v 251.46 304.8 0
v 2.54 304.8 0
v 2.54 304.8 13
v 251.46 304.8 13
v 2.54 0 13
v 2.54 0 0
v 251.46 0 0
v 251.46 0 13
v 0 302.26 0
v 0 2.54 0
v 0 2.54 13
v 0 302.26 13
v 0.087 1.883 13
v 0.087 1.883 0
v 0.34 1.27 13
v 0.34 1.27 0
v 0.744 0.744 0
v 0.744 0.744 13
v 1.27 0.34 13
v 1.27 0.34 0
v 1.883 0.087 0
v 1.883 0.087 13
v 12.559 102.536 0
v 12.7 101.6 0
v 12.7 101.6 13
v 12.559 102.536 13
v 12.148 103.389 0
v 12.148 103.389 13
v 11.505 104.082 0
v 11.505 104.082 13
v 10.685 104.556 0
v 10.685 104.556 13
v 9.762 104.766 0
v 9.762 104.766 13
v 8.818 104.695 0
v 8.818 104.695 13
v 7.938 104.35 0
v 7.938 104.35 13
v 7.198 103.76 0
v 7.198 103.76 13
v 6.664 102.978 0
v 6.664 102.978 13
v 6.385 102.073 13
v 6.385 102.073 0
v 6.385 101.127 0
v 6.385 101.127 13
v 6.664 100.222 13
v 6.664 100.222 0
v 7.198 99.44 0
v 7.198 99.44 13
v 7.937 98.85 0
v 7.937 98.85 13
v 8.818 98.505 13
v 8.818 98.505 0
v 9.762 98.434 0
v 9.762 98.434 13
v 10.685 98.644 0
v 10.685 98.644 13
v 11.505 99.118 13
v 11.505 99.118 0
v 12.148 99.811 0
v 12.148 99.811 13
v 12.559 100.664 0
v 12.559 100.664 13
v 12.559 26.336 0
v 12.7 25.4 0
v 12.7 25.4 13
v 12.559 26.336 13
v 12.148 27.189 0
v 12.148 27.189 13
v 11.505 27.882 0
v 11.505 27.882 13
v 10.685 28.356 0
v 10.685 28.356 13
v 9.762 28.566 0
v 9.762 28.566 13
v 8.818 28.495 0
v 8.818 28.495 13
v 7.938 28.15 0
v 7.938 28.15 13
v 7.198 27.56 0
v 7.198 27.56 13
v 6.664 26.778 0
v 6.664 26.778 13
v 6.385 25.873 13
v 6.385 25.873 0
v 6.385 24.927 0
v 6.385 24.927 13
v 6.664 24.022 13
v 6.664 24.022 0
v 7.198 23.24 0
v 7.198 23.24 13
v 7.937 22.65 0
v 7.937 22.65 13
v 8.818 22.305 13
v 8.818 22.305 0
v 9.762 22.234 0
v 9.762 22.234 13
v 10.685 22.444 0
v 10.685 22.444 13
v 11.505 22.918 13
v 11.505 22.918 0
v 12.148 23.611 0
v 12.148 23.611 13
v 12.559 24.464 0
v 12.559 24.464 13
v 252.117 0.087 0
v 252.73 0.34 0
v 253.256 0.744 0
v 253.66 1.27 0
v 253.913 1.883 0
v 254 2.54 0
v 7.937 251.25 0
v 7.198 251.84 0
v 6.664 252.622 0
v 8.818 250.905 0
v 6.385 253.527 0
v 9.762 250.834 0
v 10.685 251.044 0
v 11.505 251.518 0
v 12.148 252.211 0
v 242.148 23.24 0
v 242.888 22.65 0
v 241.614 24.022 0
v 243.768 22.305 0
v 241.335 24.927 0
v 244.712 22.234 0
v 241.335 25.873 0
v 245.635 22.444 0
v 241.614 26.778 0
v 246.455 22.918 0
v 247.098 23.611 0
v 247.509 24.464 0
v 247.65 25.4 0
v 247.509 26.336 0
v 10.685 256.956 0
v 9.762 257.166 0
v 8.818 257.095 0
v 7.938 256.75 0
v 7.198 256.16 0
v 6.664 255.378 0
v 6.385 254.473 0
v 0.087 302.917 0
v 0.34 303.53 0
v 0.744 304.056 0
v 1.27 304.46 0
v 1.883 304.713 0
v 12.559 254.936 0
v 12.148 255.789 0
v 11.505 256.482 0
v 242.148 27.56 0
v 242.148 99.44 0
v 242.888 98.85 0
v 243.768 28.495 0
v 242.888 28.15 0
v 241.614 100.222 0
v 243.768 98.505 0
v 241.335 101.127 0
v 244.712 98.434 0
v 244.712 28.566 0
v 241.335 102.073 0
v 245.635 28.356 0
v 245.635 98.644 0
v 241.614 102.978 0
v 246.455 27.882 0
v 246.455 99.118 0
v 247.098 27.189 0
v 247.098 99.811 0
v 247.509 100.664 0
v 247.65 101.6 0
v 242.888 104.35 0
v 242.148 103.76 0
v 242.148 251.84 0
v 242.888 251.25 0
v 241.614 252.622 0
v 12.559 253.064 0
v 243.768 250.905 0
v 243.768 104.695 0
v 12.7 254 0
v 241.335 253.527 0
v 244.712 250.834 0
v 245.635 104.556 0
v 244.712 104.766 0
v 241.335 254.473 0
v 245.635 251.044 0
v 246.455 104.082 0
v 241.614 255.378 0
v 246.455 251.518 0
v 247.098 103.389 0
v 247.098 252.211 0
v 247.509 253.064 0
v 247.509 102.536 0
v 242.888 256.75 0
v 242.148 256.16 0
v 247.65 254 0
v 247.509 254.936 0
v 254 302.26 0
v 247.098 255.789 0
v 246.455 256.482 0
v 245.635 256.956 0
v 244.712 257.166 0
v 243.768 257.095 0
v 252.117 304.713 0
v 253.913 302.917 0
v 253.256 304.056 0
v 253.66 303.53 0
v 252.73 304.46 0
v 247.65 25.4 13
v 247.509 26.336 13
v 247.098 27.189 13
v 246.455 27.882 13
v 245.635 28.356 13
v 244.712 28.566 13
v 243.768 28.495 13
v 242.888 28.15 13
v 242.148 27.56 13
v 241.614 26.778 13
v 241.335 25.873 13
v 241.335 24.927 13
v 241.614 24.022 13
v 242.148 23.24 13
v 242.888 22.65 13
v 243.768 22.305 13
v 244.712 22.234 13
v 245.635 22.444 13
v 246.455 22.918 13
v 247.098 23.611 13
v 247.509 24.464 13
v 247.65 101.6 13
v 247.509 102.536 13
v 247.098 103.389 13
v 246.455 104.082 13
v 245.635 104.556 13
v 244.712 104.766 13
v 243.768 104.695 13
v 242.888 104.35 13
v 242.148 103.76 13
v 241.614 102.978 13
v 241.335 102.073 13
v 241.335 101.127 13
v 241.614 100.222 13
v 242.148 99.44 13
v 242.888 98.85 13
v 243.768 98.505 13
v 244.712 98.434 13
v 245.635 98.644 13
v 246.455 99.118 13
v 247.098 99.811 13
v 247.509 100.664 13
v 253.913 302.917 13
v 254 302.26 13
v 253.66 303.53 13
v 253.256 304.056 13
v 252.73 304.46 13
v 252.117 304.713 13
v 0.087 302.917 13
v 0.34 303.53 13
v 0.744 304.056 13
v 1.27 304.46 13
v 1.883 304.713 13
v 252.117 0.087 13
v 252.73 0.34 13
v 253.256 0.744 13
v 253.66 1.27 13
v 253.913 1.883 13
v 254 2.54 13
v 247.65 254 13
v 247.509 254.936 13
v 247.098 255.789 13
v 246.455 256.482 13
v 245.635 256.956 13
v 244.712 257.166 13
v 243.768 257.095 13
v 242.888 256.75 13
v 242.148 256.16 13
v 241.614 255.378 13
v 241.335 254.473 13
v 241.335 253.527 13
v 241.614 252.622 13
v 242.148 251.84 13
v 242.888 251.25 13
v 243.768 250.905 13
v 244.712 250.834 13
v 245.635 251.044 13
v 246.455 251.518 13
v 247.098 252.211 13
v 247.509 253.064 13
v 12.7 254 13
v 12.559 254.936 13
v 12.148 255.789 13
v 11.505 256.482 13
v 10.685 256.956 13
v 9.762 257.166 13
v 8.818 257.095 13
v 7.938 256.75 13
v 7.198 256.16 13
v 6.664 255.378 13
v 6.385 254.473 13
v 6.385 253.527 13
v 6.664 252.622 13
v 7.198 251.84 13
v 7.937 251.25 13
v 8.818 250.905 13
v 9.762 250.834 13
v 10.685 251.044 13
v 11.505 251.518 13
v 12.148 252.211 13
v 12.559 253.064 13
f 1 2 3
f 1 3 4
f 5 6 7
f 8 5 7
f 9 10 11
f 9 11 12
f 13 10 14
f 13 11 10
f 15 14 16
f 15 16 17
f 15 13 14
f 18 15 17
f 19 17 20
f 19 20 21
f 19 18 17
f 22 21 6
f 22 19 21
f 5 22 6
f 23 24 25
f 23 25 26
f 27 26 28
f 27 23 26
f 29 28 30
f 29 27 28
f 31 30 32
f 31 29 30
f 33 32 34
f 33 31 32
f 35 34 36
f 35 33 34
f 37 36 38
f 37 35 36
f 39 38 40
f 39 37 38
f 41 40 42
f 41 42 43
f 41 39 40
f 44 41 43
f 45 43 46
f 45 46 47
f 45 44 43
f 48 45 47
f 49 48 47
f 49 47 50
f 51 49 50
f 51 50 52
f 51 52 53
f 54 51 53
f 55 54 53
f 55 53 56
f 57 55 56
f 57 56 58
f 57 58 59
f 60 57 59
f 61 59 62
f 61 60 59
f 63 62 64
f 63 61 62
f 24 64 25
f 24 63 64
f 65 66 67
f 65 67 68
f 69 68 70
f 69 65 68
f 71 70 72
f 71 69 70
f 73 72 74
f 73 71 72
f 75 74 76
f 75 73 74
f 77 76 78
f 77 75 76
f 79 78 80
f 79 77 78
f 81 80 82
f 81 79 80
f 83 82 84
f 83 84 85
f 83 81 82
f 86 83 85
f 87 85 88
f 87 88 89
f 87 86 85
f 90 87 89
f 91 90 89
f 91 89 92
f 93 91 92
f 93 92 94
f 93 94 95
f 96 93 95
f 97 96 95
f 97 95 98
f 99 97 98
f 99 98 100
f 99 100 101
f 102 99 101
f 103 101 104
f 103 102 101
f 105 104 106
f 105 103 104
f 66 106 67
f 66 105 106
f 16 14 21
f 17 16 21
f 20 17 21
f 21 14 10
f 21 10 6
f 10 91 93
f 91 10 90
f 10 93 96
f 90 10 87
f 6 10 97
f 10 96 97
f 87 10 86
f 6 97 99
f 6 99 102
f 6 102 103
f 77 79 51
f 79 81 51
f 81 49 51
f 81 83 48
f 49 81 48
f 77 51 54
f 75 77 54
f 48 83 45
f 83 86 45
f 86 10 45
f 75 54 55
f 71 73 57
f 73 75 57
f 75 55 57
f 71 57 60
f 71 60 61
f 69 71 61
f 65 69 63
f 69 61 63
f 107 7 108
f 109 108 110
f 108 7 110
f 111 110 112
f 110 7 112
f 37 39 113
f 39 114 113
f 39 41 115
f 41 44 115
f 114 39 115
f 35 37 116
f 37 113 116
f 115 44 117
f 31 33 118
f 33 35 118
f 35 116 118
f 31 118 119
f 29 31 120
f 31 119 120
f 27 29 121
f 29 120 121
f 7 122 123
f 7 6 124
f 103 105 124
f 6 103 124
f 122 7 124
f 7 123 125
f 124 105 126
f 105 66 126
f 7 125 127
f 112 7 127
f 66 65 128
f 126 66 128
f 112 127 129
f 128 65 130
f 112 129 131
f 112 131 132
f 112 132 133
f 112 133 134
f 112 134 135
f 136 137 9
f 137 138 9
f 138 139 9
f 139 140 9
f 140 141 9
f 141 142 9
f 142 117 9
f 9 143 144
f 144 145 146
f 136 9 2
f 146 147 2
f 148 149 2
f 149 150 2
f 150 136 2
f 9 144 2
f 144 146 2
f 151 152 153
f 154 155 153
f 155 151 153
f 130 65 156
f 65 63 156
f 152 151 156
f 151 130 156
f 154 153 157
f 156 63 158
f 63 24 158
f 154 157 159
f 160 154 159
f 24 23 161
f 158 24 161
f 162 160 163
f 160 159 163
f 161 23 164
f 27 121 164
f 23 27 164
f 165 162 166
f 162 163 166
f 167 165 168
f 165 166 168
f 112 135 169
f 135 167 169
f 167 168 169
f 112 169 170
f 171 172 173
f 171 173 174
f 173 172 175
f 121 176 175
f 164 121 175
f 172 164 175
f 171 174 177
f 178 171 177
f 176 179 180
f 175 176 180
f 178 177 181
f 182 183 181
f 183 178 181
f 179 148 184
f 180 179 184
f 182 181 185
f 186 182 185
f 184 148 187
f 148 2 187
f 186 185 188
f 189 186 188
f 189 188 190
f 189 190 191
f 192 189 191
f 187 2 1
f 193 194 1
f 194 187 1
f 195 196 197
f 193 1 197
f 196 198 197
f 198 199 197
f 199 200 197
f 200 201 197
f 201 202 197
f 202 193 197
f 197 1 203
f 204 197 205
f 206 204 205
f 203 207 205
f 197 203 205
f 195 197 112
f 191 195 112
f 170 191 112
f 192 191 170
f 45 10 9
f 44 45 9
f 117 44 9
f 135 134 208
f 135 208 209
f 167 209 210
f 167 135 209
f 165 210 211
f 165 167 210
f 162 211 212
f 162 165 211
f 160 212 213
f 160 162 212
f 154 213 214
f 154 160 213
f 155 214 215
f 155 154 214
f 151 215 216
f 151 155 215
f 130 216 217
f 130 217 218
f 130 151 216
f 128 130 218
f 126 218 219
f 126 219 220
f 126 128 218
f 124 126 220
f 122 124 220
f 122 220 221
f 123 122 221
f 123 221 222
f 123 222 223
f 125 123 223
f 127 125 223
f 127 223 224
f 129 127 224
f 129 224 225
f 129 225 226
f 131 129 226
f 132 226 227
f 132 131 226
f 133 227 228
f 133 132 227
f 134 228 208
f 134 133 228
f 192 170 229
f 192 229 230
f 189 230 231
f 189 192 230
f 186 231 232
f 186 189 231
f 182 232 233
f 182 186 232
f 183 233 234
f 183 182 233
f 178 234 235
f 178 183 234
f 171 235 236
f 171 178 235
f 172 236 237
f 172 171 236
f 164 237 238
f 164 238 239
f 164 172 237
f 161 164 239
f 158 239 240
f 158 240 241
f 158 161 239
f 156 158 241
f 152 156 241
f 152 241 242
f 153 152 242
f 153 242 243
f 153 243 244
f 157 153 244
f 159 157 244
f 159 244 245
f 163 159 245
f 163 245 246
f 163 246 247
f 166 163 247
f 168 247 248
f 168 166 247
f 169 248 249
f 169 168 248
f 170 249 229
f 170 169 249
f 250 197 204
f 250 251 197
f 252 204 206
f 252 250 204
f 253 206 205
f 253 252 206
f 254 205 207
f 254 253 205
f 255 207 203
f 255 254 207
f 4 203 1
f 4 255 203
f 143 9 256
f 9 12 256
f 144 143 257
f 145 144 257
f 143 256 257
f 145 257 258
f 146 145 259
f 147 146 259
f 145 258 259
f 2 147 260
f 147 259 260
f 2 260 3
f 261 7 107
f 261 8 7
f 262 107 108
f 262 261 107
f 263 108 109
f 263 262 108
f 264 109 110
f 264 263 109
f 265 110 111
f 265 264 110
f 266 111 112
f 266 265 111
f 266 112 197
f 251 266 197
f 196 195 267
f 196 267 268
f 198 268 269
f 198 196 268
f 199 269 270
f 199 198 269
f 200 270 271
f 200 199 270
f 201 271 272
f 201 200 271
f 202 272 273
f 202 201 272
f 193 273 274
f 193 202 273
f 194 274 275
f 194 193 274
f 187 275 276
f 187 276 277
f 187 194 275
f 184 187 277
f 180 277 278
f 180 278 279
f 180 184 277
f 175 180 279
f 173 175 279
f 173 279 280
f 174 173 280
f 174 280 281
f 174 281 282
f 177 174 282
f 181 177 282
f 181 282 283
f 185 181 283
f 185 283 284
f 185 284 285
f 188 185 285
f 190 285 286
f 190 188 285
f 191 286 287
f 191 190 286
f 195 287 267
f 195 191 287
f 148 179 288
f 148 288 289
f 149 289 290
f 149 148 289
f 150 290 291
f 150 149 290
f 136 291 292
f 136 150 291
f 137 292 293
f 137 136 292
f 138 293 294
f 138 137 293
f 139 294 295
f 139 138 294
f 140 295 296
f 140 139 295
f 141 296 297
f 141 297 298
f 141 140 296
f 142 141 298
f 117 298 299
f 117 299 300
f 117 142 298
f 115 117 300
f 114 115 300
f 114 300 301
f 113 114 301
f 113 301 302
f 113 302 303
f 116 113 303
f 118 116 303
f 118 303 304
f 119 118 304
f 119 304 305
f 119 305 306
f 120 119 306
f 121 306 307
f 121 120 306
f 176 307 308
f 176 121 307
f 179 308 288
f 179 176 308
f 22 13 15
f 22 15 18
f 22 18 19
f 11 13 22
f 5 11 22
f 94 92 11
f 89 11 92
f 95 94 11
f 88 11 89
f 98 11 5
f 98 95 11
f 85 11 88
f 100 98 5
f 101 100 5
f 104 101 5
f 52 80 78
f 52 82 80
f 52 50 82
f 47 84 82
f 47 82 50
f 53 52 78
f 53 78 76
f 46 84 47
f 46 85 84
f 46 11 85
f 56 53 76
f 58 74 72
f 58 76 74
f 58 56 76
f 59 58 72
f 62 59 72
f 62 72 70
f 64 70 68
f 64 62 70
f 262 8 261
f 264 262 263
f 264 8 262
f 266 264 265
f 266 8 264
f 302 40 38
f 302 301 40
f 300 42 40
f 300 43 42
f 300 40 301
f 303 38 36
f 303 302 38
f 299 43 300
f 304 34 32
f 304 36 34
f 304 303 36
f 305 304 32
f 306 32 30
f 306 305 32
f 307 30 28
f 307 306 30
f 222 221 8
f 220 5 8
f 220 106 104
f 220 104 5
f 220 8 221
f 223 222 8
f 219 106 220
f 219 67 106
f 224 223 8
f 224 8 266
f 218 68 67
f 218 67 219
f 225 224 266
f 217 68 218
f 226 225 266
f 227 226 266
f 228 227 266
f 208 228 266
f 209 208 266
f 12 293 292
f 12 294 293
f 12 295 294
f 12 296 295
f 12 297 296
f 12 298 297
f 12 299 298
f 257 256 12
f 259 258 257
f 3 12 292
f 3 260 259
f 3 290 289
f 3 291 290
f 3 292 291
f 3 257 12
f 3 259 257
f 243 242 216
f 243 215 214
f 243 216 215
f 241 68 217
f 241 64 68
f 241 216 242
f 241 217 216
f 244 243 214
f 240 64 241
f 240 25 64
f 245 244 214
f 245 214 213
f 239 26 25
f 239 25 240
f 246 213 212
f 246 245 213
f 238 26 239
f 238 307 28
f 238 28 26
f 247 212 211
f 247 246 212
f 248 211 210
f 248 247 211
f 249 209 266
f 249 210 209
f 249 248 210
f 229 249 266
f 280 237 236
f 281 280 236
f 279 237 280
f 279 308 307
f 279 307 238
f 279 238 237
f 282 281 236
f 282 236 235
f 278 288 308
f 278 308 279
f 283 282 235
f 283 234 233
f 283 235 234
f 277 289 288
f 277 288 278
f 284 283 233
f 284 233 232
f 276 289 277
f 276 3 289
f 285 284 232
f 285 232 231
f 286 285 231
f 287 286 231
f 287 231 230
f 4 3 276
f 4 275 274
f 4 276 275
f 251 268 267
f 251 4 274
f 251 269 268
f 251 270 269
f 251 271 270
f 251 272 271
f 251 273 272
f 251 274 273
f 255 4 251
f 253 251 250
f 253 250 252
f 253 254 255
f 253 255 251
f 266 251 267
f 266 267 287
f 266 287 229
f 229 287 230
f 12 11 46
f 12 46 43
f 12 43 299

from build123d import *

# Parameters (mm, degrees)
SKETCH_W    = 254
SKETCH_H    = 304.8
SKETCH_R    = 3.175
PAD_DEPTH   = 12.999999
FILLET_R    = 2.54
FILLET001_R = 2.54
FILLET002_R = 2.54


with BuildPart() as part:
    # Sketch → Pad (new body)
    with BuildSketch(Plane.XY):
        with Locations((127, 152.4)):
            Rectangle(SKETCH_W, SKETCH_H)
        with Locations((9.525, 25.4)):
            Circle(SKETCH_R, mode=Mode.SUBTRACT)
        with Locations((9.525, 101.6)):
            Circle(SKETCH_R, mode=Mode.SUBTRACT)
        with Locations((9.525, 254)):
            Circle(SKETCH_R, mode=Mode.SUBTRACT)
        with Locations((244.475, 254)):
            Circle(SKETCH_R, mode=Mode.SUBTRACT)
        with Locations((244.475, 101.6)):
            Circle(SKETCH_R, mode=Mode.SUBTRACT)
        with Locations((244.475, 25.4)):
            Circle(SKETCH_R, mode=Mode.SUBTRACT)
    extrude(amount=PAD_DEPTH)

    # Fillet
    fillet_edges = [part.edges().sort_by_distance(p)[0] for p in [
        (0, 0, 6.5),
    ]]
    fillet(fillet_edges, radius=FILLET_R)

    # Fillet001
    fillet001_edges = [part.edges().sort_by_distance(p)[0] for p in [
        (254, 0, 6.5),
    ]]
    fillet(fillet001_edges, radius=FILLET001_R)

    # Fillet002
    fillet002_edges = [part.edges().sort_by_distance(p)[0] for p in [
        (0, 304.8, 6.5),
        (254, 304.8, 6.5),
    ]]
    fillet(fillet002_edges, radius=FILLET002_R)


solid = part.part
